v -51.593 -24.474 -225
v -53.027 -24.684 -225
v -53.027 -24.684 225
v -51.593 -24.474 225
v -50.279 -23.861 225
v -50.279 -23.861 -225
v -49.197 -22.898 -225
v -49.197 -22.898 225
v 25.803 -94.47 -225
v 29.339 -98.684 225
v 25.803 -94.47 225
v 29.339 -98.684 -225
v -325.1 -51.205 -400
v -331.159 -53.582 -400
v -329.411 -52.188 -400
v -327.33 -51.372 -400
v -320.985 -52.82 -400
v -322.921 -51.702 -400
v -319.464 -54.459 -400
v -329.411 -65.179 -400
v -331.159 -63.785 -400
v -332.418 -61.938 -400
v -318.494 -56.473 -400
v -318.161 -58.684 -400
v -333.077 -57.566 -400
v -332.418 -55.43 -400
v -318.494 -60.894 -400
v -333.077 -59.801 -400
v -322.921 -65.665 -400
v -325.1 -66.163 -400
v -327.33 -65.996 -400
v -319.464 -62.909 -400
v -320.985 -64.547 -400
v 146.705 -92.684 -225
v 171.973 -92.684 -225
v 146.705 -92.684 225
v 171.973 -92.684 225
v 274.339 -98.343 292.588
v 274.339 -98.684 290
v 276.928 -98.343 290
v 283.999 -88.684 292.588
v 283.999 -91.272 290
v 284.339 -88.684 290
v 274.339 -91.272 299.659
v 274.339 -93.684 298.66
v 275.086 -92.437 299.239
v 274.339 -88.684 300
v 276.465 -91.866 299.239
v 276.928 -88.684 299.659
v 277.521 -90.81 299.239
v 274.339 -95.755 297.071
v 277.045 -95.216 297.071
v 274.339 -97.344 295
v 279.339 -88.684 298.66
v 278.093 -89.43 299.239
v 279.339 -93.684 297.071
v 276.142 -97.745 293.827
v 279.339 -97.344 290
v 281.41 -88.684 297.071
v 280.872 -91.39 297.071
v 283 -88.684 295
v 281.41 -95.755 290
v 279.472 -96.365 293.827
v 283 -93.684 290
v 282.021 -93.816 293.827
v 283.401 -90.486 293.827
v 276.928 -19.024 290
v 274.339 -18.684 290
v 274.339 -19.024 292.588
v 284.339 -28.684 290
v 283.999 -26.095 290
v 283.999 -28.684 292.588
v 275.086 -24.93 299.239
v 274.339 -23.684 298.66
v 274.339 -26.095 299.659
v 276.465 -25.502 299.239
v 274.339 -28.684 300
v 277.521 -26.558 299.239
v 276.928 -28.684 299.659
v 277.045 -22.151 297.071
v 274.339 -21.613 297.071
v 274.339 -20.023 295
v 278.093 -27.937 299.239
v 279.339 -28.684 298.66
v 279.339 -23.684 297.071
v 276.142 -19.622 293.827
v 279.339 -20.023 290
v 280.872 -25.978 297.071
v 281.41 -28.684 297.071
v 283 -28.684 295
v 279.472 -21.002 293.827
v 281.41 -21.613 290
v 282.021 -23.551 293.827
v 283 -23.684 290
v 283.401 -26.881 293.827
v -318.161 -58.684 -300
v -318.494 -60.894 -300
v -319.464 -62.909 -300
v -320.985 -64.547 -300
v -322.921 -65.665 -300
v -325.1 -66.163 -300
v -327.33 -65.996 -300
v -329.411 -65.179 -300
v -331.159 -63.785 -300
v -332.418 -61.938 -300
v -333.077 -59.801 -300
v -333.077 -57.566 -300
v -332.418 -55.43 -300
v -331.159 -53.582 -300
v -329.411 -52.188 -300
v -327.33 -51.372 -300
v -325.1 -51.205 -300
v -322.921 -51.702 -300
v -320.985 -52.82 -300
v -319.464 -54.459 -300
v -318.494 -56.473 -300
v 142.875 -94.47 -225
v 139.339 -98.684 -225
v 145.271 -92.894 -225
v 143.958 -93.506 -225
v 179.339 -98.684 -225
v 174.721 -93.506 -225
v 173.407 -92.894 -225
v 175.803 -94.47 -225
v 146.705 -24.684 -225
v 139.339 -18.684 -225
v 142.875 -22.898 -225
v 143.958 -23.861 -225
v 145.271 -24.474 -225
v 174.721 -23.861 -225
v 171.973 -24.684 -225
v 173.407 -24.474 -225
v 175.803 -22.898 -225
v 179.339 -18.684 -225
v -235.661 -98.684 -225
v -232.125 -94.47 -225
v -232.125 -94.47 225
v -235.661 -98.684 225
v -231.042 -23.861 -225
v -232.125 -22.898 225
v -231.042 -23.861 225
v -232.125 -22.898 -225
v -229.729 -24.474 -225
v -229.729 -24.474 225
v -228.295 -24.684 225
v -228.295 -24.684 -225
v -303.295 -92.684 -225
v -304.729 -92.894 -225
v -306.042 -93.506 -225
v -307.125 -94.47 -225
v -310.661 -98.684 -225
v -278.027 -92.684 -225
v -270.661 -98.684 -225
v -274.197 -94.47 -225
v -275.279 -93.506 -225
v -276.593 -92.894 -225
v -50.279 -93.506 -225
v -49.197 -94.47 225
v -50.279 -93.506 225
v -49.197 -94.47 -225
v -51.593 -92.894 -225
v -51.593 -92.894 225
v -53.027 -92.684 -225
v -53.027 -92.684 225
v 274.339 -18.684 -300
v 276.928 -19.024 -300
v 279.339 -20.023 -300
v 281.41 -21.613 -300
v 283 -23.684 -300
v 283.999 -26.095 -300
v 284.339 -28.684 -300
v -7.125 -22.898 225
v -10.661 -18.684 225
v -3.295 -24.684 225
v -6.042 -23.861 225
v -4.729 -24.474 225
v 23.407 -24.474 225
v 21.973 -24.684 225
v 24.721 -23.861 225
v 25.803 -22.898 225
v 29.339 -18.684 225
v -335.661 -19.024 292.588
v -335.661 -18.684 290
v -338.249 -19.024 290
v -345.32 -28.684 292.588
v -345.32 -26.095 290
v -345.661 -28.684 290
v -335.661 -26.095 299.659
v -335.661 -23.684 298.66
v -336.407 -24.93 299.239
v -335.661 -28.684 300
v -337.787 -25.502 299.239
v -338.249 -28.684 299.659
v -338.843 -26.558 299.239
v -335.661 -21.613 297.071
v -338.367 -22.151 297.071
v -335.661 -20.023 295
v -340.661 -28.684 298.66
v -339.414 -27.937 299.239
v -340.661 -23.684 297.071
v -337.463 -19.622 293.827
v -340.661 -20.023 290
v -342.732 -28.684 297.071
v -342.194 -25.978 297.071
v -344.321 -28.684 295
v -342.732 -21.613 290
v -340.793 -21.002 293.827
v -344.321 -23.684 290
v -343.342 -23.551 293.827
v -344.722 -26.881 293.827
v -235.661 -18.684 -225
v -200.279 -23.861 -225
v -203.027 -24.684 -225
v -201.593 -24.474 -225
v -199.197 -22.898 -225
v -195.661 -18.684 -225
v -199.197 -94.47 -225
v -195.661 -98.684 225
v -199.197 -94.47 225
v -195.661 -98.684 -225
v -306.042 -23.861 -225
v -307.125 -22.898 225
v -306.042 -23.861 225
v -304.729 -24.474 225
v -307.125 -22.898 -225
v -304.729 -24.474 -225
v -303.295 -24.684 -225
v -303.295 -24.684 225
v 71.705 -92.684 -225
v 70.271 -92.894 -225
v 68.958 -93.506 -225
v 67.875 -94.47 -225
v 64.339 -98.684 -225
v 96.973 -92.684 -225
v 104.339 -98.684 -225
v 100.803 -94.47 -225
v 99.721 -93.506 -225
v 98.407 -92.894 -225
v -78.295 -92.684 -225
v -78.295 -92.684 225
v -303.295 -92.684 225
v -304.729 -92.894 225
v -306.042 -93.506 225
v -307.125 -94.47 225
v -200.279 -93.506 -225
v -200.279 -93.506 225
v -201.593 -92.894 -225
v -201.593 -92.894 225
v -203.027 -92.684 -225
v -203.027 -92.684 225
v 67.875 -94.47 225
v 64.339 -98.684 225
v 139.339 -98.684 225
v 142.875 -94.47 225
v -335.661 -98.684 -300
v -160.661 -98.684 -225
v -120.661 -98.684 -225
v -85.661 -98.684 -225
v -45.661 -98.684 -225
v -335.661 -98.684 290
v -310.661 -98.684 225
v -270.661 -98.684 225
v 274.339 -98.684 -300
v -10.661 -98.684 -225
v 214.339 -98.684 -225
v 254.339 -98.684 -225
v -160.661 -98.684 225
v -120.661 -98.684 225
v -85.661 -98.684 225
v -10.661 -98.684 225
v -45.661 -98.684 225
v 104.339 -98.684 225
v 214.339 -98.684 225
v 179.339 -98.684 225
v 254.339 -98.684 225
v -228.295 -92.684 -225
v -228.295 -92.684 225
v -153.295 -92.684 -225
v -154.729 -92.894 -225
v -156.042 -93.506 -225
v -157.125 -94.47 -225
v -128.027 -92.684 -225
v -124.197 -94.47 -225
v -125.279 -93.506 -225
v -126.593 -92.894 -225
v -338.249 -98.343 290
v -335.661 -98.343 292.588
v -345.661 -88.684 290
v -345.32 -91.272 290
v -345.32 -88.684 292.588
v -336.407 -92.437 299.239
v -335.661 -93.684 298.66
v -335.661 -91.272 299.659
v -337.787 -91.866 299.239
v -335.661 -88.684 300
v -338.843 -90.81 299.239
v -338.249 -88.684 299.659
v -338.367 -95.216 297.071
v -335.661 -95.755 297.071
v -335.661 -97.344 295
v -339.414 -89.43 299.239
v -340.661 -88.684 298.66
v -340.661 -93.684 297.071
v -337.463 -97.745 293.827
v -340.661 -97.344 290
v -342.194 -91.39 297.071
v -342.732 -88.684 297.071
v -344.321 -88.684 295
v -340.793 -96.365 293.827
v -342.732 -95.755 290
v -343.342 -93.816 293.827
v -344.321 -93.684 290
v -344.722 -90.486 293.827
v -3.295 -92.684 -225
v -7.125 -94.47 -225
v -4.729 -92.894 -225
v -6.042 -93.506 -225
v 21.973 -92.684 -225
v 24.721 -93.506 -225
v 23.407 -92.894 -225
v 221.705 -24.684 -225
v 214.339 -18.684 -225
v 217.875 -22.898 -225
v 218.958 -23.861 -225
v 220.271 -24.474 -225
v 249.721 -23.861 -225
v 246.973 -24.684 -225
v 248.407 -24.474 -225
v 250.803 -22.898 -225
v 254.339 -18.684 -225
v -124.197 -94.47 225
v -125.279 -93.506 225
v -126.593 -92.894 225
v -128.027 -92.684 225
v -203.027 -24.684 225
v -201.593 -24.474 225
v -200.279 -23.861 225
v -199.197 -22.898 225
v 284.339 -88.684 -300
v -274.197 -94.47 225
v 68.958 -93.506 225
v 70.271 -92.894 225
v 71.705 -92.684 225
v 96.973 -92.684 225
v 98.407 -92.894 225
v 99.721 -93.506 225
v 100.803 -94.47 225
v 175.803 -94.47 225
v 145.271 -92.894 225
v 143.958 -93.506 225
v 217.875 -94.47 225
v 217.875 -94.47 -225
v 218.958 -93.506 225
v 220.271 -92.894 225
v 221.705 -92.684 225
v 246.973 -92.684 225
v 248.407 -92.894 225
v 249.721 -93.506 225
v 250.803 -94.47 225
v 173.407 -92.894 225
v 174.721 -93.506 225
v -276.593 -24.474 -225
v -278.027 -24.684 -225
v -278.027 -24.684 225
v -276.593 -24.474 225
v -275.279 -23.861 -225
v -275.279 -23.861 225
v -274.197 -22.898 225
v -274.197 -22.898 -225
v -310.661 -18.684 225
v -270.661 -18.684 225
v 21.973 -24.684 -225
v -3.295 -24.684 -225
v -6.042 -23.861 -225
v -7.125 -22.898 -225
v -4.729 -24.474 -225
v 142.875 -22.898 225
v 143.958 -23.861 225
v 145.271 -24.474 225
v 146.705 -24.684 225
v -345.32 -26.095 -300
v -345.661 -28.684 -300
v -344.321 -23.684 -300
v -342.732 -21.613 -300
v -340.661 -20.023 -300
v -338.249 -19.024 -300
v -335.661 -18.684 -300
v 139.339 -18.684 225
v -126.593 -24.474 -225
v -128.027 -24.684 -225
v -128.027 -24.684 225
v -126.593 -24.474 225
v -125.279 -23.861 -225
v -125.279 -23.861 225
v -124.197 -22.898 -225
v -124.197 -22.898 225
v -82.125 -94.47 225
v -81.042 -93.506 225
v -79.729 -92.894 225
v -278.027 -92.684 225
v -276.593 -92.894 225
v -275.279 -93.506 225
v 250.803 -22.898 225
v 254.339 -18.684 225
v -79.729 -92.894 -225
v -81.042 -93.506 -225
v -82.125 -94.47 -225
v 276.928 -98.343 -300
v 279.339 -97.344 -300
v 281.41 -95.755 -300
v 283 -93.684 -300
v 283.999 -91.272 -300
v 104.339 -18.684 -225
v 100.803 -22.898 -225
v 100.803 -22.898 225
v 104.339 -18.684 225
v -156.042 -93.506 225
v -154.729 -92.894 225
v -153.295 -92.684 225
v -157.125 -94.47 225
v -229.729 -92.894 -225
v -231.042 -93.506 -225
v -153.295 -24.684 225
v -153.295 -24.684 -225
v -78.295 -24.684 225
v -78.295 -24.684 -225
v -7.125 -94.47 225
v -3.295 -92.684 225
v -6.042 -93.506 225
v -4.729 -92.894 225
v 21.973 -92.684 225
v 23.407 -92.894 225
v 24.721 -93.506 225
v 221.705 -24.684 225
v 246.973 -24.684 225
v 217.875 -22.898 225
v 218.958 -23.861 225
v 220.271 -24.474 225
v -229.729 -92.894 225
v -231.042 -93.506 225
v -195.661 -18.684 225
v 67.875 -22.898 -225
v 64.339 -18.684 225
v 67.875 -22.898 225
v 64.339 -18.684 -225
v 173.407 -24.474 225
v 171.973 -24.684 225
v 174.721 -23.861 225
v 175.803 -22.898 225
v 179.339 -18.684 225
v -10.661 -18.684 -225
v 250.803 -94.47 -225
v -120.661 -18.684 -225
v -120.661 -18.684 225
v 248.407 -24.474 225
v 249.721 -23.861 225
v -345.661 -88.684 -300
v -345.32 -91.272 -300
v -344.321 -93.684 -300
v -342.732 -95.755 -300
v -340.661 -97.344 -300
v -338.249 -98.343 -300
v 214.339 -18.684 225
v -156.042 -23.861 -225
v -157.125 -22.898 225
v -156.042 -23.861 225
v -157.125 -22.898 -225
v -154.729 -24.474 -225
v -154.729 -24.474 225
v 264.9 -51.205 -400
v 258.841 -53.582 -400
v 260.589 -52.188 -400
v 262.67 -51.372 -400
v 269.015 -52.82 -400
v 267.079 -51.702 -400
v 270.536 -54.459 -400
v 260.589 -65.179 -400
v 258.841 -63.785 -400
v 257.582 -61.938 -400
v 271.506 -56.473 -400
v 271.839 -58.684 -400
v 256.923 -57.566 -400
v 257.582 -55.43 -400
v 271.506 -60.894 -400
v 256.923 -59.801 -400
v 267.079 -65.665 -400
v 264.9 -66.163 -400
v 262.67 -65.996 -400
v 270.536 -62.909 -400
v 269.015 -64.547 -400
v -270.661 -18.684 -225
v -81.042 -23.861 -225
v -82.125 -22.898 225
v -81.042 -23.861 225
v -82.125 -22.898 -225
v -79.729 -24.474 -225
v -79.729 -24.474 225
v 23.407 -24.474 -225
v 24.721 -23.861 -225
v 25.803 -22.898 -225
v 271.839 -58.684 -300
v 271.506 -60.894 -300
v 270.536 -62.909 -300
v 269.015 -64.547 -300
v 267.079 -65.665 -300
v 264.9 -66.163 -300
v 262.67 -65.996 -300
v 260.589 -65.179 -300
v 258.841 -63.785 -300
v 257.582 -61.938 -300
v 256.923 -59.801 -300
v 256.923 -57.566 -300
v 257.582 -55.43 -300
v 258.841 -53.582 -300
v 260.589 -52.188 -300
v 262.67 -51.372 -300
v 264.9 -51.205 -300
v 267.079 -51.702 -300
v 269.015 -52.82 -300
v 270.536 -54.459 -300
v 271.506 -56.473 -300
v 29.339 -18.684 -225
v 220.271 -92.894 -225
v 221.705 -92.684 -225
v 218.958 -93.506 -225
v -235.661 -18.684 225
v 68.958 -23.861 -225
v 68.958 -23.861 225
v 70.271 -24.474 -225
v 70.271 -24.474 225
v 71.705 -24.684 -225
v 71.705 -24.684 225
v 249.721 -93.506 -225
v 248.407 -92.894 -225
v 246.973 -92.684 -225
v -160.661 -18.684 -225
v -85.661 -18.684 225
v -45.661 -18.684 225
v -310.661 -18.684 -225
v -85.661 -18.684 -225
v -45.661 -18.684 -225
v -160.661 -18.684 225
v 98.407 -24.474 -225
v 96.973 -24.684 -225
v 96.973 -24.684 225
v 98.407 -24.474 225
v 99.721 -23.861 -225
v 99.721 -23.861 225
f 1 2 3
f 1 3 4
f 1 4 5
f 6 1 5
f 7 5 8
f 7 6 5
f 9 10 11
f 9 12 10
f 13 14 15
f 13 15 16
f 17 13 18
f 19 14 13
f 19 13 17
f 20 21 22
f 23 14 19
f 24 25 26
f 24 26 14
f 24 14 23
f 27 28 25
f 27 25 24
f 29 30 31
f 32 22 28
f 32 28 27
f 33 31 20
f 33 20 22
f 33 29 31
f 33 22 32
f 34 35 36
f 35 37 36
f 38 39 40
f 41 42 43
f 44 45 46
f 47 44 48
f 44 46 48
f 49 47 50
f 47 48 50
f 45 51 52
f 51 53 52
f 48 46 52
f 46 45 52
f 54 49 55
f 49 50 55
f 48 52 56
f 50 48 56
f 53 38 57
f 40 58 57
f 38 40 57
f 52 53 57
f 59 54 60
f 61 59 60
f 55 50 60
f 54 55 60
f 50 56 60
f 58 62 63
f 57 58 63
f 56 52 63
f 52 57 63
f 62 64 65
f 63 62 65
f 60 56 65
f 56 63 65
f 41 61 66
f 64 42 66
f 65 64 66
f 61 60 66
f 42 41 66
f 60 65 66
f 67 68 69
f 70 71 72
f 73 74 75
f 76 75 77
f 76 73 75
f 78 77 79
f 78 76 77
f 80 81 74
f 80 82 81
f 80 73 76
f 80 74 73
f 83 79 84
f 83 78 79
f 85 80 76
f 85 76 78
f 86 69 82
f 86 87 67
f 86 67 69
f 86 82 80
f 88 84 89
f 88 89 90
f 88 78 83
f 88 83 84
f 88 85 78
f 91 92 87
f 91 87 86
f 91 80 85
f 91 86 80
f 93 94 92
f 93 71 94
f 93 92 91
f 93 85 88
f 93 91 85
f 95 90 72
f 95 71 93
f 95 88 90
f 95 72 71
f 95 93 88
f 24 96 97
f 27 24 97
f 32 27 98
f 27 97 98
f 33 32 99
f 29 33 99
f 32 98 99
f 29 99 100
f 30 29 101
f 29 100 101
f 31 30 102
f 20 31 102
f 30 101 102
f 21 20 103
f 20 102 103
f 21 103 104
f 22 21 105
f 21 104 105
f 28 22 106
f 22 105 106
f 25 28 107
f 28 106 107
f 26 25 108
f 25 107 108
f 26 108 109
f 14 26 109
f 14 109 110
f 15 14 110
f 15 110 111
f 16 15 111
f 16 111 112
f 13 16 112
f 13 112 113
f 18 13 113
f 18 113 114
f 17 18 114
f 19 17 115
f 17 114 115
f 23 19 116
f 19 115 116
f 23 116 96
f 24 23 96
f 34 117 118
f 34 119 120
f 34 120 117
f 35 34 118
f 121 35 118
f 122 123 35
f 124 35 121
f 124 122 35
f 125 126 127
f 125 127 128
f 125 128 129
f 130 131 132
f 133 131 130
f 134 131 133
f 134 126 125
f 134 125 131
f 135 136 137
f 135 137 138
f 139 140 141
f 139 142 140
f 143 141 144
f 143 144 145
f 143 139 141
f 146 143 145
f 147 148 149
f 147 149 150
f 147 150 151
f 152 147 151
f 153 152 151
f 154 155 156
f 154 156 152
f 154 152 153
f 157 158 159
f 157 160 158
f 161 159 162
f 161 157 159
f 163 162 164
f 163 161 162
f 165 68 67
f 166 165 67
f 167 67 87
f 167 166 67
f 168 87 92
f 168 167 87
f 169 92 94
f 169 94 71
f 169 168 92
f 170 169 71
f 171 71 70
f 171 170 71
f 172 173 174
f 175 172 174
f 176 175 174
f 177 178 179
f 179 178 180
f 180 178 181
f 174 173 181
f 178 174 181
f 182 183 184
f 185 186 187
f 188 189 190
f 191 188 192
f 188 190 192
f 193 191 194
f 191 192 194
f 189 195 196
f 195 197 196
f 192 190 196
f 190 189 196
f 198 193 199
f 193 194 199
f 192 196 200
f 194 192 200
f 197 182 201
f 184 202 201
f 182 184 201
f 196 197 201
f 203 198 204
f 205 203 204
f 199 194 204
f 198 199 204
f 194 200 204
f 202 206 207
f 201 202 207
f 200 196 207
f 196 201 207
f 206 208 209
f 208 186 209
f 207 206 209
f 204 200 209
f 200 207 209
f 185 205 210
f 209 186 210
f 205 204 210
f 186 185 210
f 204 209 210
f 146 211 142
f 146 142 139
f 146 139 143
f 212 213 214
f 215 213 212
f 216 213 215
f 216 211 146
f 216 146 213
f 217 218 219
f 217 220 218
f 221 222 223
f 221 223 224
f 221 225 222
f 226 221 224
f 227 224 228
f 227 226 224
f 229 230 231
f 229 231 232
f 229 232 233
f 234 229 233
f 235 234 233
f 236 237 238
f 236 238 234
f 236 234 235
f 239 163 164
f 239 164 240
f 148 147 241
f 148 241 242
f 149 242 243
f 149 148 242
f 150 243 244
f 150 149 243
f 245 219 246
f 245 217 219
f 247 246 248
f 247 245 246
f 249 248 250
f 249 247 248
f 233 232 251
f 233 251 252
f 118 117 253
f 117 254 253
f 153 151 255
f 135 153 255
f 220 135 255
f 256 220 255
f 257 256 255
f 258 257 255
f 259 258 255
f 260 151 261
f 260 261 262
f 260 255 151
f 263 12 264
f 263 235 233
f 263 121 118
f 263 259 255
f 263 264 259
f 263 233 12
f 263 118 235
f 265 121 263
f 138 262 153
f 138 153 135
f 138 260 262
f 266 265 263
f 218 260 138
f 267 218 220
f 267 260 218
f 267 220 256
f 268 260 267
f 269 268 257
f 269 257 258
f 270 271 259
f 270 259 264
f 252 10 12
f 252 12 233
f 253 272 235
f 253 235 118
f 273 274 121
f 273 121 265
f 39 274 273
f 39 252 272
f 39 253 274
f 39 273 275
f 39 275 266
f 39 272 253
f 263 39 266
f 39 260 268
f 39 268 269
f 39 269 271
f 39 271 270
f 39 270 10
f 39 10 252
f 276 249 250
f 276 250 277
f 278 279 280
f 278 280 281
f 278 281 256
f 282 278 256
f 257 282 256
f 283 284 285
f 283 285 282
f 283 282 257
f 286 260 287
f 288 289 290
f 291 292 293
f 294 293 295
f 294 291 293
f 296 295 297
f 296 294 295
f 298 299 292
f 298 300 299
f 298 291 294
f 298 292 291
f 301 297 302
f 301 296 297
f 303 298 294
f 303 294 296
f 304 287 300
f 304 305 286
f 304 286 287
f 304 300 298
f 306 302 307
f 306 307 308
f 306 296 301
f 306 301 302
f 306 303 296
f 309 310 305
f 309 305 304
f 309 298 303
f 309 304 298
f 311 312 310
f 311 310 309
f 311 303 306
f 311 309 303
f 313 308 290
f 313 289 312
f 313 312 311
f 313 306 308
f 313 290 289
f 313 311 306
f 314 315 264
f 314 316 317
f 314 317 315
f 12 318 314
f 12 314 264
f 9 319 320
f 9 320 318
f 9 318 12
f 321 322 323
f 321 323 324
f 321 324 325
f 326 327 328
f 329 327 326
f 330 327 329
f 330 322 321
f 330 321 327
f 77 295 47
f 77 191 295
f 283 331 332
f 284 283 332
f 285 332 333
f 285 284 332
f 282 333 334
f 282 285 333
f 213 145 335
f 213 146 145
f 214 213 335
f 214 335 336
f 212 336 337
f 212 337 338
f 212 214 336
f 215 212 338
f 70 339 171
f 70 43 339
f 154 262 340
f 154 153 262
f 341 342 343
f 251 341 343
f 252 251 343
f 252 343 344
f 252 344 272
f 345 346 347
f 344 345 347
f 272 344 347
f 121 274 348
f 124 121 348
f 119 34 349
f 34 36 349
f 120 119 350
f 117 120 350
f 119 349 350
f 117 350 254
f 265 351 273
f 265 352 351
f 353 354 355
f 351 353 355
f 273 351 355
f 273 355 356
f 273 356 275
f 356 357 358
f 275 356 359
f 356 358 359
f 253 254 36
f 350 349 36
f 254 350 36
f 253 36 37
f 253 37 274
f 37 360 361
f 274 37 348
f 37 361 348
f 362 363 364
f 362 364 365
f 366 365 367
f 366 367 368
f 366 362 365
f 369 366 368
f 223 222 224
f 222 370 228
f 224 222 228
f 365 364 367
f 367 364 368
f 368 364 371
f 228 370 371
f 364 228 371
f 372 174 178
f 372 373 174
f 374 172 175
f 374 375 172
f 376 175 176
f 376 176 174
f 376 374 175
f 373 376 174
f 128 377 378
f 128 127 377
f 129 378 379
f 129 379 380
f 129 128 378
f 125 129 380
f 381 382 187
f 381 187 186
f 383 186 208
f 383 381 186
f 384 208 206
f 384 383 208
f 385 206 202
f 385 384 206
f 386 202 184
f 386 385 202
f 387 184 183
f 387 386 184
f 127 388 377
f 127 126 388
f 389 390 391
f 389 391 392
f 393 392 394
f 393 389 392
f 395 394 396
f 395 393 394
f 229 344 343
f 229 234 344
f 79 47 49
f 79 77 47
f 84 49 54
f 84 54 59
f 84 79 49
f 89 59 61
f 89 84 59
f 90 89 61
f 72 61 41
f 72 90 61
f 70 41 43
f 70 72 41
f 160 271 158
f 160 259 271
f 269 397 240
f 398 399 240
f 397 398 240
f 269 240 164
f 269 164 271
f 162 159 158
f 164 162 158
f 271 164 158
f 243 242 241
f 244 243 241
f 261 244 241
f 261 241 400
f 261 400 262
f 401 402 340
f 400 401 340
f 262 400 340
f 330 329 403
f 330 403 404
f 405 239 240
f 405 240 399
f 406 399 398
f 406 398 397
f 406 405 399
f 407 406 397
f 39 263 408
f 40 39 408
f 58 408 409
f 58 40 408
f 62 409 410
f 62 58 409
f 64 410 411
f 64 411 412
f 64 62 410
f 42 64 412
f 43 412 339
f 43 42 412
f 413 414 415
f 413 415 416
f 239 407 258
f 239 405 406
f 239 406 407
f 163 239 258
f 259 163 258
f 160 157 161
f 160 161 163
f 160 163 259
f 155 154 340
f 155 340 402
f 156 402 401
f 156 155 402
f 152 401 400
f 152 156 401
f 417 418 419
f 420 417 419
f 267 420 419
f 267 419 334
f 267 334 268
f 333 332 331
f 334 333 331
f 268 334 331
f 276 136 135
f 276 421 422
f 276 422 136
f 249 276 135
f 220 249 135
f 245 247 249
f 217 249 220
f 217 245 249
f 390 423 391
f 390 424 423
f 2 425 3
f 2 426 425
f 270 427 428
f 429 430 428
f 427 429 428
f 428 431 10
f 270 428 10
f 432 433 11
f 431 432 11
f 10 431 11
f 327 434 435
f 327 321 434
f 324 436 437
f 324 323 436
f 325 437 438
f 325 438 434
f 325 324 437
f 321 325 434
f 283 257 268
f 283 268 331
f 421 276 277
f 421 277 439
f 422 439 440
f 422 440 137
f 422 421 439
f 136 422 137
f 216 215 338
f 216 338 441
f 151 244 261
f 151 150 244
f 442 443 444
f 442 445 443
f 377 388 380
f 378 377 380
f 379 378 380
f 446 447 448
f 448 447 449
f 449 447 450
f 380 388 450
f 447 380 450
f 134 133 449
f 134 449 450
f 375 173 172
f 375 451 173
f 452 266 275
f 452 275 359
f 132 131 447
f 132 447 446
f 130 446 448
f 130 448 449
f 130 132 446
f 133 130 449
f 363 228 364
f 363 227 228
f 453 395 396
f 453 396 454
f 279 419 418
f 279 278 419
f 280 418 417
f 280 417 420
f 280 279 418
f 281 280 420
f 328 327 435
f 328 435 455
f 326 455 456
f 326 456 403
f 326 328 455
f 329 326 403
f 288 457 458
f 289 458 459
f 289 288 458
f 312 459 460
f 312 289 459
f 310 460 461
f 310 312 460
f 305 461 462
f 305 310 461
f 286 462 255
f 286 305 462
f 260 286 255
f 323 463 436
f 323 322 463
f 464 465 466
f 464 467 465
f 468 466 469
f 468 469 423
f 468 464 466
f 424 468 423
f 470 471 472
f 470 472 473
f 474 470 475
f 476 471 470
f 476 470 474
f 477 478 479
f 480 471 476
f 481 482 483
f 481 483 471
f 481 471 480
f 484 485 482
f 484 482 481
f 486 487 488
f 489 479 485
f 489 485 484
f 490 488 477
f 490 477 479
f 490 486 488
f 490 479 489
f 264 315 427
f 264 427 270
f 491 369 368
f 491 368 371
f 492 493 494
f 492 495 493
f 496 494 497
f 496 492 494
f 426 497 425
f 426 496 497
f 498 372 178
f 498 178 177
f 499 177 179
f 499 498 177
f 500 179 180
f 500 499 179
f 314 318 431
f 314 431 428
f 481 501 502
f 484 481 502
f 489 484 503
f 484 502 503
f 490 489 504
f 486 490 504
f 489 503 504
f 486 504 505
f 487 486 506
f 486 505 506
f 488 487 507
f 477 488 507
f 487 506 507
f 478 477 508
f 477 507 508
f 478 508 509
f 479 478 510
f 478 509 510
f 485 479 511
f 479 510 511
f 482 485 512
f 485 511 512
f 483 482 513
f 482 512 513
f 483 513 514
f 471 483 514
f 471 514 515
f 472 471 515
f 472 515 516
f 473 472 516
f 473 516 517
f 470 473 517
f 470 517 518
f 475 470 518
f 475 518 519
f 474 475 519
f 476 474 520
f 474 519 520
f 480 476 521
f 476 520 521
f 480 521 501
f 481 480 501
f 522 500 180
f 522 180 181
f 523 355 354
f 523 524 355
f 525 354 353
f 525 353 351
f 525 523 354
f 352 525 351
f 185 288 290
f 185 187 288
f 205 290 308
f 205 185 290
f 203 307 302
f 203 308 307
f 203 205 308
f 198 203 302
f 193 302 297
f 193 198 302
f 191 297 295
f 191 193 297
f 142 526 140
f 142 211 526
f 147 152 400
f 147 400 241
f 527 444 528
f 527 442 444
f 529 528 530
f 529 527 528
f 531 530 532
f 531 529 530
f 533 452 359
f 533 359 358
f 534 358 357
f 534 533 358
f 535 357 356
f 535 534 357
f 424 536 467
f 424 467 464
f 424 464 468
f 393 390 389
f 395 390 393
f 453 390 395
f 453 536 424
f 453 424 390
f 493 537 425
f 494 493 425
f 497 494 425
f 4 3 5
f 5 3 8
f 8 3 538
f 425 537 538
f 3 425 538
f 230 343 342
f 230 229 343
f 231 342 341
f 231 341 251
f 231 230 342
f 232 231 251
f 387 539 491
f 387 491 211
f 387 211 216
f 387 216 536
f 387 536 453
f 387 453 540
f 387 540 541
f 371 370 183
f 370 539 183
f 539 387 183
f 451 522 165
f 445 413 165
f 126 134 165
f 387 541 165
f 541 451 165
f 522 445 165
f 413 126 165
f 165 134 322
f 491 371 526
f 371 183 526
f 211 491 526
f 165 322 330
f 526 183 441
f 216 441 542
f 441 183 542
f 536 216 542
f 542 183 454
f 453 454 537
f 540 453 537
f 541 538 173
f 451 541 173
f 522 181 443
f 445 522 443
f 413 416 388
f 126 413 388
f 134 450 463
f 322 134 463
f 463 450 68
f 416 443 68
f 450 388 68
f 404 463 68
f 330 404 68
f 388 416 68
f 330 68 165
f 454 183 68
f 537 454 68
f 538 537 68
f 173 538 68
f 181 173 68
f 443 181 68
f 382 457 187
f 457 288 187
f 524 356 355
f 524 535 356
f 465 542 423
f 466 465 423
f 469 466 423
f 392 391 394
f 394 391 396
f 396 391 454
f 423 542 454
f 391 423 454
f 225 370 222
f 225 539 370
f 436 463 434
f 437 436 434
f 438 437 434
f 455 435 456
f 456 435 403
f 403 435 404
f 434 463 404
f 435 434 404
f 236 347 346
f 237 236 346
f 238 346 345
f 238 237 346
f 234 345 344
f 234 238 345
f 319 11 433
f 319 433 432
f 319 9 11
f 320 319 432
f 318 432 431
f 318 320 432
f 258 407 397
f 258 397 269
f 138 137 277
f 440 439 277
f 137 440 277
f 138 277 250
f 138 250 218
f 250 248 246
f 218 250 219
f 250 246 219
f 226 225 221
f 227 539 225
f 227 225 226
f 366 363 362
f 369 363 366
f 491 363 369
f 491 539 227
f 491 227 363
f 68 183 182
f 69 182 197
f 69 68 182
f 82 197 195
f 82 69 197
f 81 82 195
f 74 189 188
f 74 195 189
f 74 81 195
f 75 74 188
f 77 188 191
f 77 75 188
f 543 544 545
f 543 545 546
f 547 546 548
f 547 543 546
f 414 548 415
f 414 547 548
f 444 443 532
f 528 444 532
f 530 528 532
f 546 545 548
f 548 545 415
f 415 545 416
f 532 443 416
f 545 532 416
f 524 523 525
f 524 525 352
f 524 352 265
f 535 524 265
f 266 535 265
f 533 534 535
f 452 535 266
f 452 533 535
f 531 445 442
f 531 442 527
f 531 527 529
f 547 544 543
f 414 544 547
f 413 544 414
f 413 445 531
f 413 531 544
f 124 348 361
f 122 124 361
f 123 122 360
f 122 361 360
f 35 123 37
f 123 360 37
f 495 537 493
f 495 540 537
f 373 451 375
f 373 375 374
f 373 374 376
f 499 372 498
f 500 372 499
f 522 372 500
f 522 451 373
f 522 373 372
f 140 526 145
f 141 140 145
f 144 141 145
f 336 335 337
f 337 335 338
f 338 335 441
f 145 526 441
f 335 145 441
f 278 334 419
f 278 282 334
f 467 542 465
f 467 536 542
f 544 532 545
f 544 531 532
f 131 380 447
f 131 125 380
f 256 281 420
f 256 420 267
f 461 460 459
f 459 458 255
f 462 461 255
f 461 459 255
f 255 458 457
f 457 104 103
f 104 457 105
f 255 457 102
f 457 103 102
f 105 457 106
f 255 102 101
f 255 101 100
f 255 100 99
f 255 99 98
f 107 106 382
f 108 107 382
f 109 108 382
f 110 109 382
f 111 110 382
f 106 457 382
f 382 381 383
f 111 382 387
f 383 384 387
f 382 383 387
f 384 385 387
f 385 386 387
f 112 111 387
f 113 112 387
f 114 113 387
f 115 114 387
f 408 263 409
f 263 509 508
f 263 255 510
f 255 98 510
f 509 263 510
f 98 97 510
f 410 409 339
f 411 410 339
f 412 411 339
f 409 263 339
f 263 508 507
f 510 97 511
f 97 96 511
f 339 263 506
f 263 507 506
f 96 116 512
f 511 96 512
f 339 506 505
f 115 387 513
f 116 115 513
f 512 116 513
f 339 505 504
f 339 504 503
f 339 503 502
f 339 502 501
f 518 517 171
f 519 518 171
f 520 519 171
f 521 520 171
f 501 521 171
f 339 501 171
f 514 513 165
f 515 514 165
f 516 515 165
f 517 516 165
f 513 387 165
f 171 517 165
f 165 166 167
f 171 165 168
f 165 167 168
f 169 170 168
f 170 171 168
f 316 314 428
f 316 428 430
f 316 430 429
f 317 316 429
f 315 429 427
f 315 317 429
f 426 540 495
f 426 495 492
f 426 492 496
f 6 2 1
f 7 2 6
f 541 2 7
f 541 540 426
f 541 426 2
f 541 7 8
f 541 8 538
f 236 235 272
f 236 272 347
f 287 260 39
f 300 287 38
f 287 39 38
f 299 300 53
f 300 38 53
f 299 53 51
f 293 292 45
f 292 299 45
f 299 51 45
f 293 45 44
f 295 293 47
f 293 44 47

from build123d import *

# Parameters (mm, degrees)
F0_W     = 630
F0_H     = 80
F1_DEPTH = 300
F2_R     = 7.5
F3_DEPTH = 100
F5_DEPTH = 225
F6_R     = 10


with BuildPart() as f1:
    # F0 (on Top) → F1 (new body, symmetric)
    with BuildSketch(Plane.XY):
        with Locations((-30.66069, -58.683639)):
            Rectangle(F0_W, F0_H)
    extrude(amount=F1_DEPTH, both=True)

    # F2 (on face) → F3 (join)
    with BuildSketch(Plane(origin=(0, 0, -300), x_dir=(1, 0, 0), z_dir=(0, 0, -1))):
        with Locations((264.33931, 58.683639)):
            Circle(F2_R)
        with Locations((-325.66069, 58.683639)):
            Circle(F2_R)
    extrude(amount=F3_DEPTH)

    # F4 (on Top) → F5 (cut, symmetric)
    with BuildSketch(Plane.XY):
        with BuildLine():
            Line((-270.66069, -18.683639), (-310.66069, -18.683639))
            Line((-310.66069, -18.683639), (-307.124776, -22.897577))
            ThreePointArc((-307.124776, -22.897577), (-305.407645, -24.215178), (-303.294554, -24.683639))
            Line((-303.294554, -24.683639), (-278.026826, -24.683639))
            ThreePointArc((-278.026826, -24.683639), (-275.913735, -24.215178), (-274.196604, -22.897577))
            Line((-274.196604, -22.897577), (-270.66069, -18.683639))
        make_face()
        with BuildLine():
            Line((-195.66069, -18.683639), (-235.66069, -18.683639))
            Line((-235.66069, -18.683639), (-232.124776, -22.897577))
            ThreePointArc((-232.124776, -22.897577), (-230.407645, -24.215178), (-228.294554, -24.683639))
            Line((-228.294554, -24.683639), (-203.026826, -24.683639))
            ThreePointArc((-203.026826, -24.683639), (-200.913735, -24.215178), (-199.196604, -22.897577))
            Line((-199.196604, -22.897577), (-195.66069, -18.683639))
        make_face()
        with BuildLine():
            Line((-120.66069, -18.683639), (-160.66069, -18.683639))
            Line((-160.66069, -18.683639), (-157.124776, -22.897577))
            ThreePointArc((-157.124776, -22.897577), (-155.407645, -24.215178), (-153.294554, -24.683639))
            Line((-153.294554, -24.683639), (-128.026826, -24.683639))
            ThreePointArc((-128.026826, -24.683639), (-125.913735, -24.215178), (-124.196604, -22.897577))
            Line((-124.196604, -22.897577), (-120.66069, -18.683639))
        make_face()
        with BuildLine():
            Line((-45.66069, -18.683639), (-85.66069, -18.683639))
            Line((-85.66069, -18.683639), (-82.124776, -22.897577))
            ThreePointArc((-82.124776, -22.897577), (-80.407645, -24.215178), (-78.294554, -24.683639))
            Line((-78.294554, -24.683639), (-53.026826, -24.683639))
            ThreePointArc((-53.026826, -24.683639), (-50.913735, -24.215178), (-49.196604, -22.897577))
            Line((-49.196604, -22.897577), (-45.66069, -18.683639))
        make_face()
        with BuildLine():
            Line((29.33931, -18.683639), (-10.66069, -18.683639))
            Line((-10.66069, -18.683639), (-7.124776, -22.897577))
            ThreePointArc((-7.124776, -22.897577), (-5.407645, -24.215178), (-3.294554, -24.683639))
            Line((-3.294554, -24.683639), (21.973174, -24.683639))
            ThreePointArc((21.973174, -24.683639), (24.086265, -24.215178), (25.803396, -22.897577))
            Line((25.803396, -22.897577), (29.33931, -18.683639))
        make_face()
        with BuildLine():
            Line((104.33931, -18.683639), (64.33931, -18.683639))
            Line((64.33931, -18.683639), (67.875224, -22.897577))
            ThreePointArc((67.875224, -22.897577), (69.592355, -24.215178), (71.705446, -24.683639))
            Line((71.705446, -24.683639), (96.973174, -24.683639))
            ThreePointArc((96.973174, -24.683639), (99.086265, -24.215178), (100.803396, -22.897577))
            Line((100.803396, -22.897577), (104.33931, -18.683639))
        make_face()
        with BuildLine():
            Line((179.33931, -18.683639), (139.33931, -18.683639))
            Line((139.33931, -18.683639), (142.875224, -22.897577))
            ThreePointArc((142.875224, -22.897577), (144.592355, -24.215178), (146.705446, -24.683639))
            Line((146.705446, -24.683639), (171.973174, -24.683639))
            ThreePointArc((171.973174, -24.683639), (174.086265, -24.215178), (175.803396, -22.897577))
            Line((175.803396, -22.897577), (179.33931, -18.683639))
        make_face()
        with BuildLine():
            Line((254.33931, -18.683639), (214.33931, -18.683639))
            Line((214.33931, -18.683639), (217.875224, -22.897577))
            ThreePointArc((217.875224, -22.897577), (219.592355, -24.215178), (221.705446, -24.683639))
            Line((221.705446, -24.683639), (246.973174, -24.683639))
            ThreePointArc((246.973174, -24.683639), (249.086265, -24.215178), (250.803396, -22.897577))
            Line((250.803396, -22.897577), (254.33931, -18.683639))
        make_face()
        with BuildLine():
            ThreePointArc((-303.294554, -92.683639), (-305.407645, -93.1521), (-307.124776, -94.469701))
            Line((-307.124776, -94.469701), (-310.66069, -98.683639))
            Line((-310.66069, -98.683639), (-270.66069, -98.683639))
            Line((-270.66069, -98.683639), (-274.196604, -94.469701))
            ThreePointArc((-274.196604, -94.469701), (-275.913735, -93.1521), (-278.026826, -92.683639))
            Line((-278.026826, -92.683639), (-303.294554, -92.683639))
        make_face()
        with BuildLine():
            Line((-232.124776, -94.469701), (-235.66069, -98.683639))
            Line((-235.66069, -98.683639), (-195.66069, -98.683639))
            Line((-195.66069, -98.683639), (-199.196604, -94.469701))
            ThreePointArc((-199.196604, -94.469701), (-200.913735, -93.1521), (-203.026826, -92.683639))
            Line((-203.026826, -92.683639), (-228.294554, -92.683639))
            ThreePointArc((-228.294554, -92.683639), (-230.407645, -93.1521), (-232.124776, -94.469701))
        make_face()
        with BuildLine():
            ThreePointArc((250.803396, -94.469701), (249.086265, -93.1521), (246.973174, -92.683639))
            Line((246.973174, -92.683639), (221.705446, -92.683639))
            ThreePointArc((221.705446, -92.683639), (219.592355, -93.1521), (217.875224, -94.469701))
            Line((217.875224, -94.469701), (214.33931, -98.683639))
            Line((214.33931, -98.683639), (254.33931, -98.683639))
            Line((254.33931, -98.683639), (250.803396, -94.469701))
        make_face()
        with BuildLine():
            Line((-82.124776, -94.469701), (-85.66069, -98.683639))
            Line((-85.66069, -98.683639), (-45.66069, -98.683639))
            Line((-45.66069, -98.683639), (-49.196604, -94.469701))
            ThreePointArc((-49.196604, -94.469701), (-50.913735, -93.1521), (-53.026826, -92.683639))
            Line((-53.026826, -92.683639), (-78.294554, -92.683639))
            ThreePointArc((-78.294554, -92.683639), (-80.407645, -93.1521), (-82.124776, -94.469701))
        make_face()
        with BuildLine():
            Line((-120.66069, -98.683639), (-124.196604, -94.469701))
            ThreePointArc((-124.196604, -94.469701), (-125.913735, -93.1521), (-128.026826, -92.683639))
            Line((-128.026826, -92.683639), (-153.294554, -92.683639))
            ThreePointArc((-153.294554, -92.683639), (-155.407645, -93.1521), (-157.124776, -94.469701))
            Line((-157.124776, -94.469701), (-160.66069, -98.683639))
            Line((-160.66069, -98.683639), (-120.66069, -98.683639))
        make_face()
        with BuildLine():
            Line((-7.124776, -94.469701), (-10.66069, -98.683639))
            Line((-10.66069, -98.683639), (29.33931, -98.683639))
            Line((29.33931, -98.683639), (25.803396, -94.469701))
            ThreePointArc((25.803396, -94.469701), (24.086265, -93.1521), (21.973174, -92.683639))
            Line((21.973174, -92.683639), (-3.294554, -92.683639))
            ThreePointArc((-3.294554, -92.683639), (-5.407645, -93.1521), (-7.124776, -94.469701))
        make_face()
        with BuildLine():
            Line((104.33931, -98.683639), (100.803396, -94.469701))
            ThreePointArc((100.803396, -94.469701), (99.086265, -93.1521), (96.973174, -92.683639))
            Line((96.973174, -92.683639), (71.705446, -92.683639))
            ThreePointArc((71.705446, -92.683639), (69.592355, -93.1521), (67.875224, -94.469701))
            Line((67.875224, -94.469701), (64.33931, -98.683639))
            Line((64.33931, -98.683639), (104.33931, -98.683639))
        make_face()
        with BuildLine():
            Line((142.875224, -94.469701), (139.33931, -98.683639))
            Line((139.33931, -98.683639), (179.33931, -98.683639))
            Line((179.33931, -98.683639), (175.803396, -94.469701))
            ThreePointArc((175.803396, -94.469701), (174.086265, -93.1521), (171.973174, -92.683639))
            Line((171.973174, -92.683639), (146.705446, -92.683639))
            ThreePointArc((146.705446, -92.683639), (144.592355, -93.1521), (142.875224, -94.469701))
        make_face()
    extrude(amount=F5_DEPTH, both=True, mode=Mode.SUBTRACT)

    # F6
    f6_edges = [f1.edges().sort_by_distance(p)[0] for p in [
        (-345.66069, -98.683639, 0),
        (-345.66069, -18.683639, 0),
        (284.33931, -98.683639, 0),
        (284.33931, -18.683639, 0),
        (-30.66069, -98.683639, 300),
        (-30.66069, -18.683639, 300),
        (284.33931, -58.683639, 300),
        (-345.66069, -58.683639, 300),
    ]]
    fillet(f6_edges, radius=F6_R)


solid = f1.part
